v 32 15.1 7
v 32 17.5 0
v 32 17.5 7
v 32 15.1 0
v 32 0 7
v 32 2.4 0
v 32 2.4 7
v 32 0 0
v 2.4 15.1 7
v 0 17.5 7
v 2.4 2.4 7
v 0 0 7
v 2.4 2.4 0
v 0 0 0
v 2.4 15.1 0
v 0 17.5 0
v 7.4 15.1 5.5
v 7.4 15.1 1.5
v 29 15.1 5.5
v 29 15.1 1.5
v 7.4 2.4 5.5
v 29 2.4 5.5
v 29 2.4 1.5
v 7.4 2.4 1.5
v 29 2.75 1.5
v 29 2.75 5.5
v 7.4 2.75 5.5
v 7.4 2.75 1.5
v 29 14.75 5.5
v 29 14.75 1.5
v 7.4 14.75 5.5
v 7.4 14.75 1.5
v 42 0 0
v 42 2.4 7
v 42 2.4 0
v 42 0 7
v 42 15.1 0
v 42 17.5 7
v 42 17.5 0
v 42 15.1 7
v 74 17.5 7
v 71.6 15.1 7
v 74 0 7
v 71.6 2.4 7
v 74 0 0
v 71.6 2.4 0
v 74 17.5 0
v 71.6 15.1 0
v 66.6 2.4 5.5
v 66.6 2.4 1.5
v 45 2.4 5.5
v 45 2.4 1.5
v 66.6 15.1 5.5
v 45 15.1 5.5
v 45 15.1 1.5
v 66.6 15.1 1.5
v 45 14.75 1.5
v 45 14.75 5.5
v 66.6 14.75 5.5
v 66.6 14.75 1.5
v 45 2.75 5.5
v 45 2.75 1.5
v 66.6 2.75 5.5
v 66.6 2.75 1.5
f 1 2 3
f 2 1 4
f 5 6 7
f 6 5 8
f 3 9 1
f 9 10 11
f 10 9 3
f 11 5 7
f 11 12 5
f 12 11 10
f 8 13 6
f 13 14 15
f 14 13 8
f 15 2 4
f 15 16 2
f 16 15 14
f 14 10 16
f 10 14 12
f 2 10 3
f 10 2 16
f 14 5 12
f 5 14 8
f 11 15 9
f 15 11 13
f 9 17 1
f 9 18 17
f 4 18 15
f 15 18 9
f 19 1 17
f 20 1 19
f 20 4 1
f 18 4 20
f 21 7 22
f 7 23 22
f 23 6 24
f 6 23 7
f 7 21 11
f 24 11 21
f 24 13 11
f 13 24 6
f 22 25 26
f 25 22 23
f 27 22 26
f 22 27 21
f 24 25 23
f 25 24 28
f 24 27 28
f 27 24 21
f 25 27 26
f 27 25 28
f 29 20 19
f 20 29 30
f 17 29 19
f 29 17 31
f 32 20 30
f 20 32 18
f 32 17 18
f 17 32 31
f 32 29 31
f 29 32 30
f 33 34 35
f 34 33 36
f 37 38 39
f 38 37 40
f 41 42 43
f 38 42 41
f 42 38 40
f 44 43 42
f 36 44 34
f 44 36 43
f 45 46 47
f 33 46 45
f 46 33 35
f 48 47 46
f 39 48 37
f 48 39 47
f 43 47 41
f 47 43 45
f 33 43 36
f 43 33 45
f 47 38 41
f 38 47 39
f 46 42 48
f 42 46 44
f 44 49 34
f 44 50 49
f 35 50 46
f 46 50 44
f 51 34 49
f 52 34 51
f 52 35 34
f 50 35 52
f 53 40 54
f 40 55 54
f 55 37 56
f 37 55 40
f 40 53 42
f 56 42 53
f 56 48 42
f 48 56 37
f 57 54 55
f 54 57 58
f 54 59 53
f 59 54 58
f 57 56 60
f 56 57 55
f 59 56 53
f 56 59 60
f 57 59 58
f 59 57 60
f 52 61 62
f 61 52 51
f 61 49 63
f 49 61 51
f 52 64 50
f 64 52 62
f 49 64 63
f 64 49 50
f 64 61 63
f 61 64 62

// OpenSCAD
// REJECTED CONCEPT — DO NOT PRINT.
// Side-entry clips cannot reach the stand uprights after the populated tray is
// installed: the continuous tray, driver envelopes, standoffs and wiring block
// the required lateral insertion path. Retained only as design history.

$fn = 36;

tray_t = 4;
upright_t = 8;
fit_clearance = 0.7;

// Only 7 mm high: install directly above the support ledges. The legacy L298N
// footprint begins 10 mm above the tray edge and the BTS footprints begin at
// 15 mm, so this stays below every PCB, standoff and lower wiring guide with
// at least 2 mm nominal vertical clearance in the worst legacy envelope.
clip_h = 7;
clip_w = 32;
wall = 2.4;
captured_stack = tray_t + upright_t;
inside_depth = captured_stack + fit_clearance;
outside_depth = inside_depth + 2 * wall;

// Shallow inner ribs remove most of the clearance after the clip is seated.
retention_rib = 0.35;

module side_entry_clip() {
    union() {
        difference() {
            cube([clip_w, outside_depth, clip_h]);

            // Cavity reaches through the open side so the clip slides on
            // horizontally; the closed end stops against the upright edge.
            translate([wall, wall, -1])
                cube([clip_w - wall + 1, inside_depth, clip_h + 2]);

        }

        // Opposed shallow ribs grip the front of the tray and the rear of the
        // upright without requiring a screw or printed thread.
        translate([wall + 5, wall - 0.1, 1.5])
            cube([clip_w - wall - 8, retention_rib + 0.1, clip_h - 3]);
        translate([wall + 5, wall + inside_depth - retention_rib, 1.5])
            cube([clip_w - wall - 8, retention_rib + 0.1, clip_h - 3]);
    }
}

// A left-opening and a right-opening clip, already arranged for printing.
side_entry_clip();
translate([2 * clip_w + 10, outside_depth, 0])
    rotate([0, 0, 180]) side_entry_clip();
